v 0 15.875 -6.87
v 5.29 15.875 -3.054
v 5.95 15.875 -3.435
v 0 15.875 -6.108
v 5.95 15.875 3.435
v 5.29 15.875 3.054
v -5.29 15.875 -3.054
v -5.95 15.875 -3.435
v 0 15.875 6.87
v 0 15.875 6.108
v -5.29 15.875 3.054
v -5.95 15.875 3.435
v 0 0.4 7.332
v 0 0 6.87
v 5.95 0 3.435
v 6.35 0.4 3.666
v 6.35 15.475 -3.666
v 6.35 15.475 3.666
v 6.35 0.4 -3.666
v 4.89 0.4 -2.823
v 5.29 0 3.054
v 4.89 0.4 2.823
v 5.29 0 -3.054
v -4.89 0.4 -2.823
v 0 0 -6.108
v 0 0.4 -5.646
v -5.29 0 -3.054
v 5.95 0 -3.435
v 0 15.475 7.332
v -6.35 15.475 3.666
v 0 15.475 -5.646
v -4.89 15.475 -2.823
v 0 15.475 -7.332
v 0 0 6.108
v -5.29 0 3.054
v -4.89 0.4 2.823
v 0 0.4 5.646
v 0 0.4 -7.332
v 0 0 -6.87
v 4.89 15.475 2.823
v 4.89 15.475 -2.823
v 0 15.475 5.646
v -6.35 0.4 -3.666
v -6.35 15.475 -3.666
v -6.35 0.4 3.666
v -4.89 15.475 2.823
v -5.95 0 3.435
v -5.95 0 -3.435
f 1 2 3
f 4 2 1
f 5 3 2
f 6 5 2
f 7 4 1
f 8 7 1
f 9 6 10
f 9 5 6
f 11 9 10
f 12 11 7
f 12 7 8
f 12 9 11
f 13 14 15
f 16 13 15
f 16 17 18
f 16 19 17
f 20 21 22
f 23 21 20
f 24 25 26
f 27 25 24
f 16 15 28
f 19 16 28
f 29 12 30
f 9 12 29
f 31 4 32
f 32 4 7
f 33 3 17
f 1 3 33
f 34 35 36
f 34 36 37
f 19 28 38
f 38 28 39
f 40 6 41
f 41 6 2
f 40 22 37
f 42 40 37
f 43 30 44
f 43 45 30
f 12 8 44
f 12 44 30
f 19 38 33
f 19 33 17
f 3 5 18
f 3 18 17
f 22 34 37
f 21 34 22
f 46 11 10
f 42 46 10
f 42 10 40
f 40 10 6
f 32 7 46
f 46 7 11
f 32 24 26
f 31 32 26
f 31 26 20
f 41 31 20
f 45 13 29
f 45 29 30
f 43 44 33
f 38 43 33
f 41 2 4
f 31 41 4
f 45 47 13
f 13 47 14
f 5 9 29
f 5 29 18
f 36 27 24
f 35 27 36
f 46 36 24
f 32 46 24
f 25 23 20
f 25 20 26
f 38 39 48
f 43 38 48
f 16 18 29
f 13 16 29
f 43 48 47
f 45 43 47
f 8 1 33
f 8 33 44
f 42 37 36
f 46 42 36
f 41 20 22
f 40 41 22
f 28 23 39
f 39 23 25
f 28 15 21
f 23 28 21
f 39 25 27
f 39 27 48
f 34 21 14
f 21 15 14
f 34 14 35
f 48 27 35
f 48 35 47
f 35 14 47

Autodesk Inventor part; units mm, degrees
ref_plane "YZ Plane" through (0, 0, 0) normal (1, 0, 0) x (0, 1, 0)
ref_plane "XZ Plane" through (0, 0, 0) normal (0, 1, 0) x (-1, 0, 0)
ref_plane "XY Plane" through (0, 0, 0) normal (0, 0, 1) x (1, 0, 0)
sketch "Sketch1" plane through (0, 0, 0) normal (0, 1, 0) x (-1, 0, 0)
  line L0 (6.35, -3.6662) -> (0, -7.3323)
  line L1 (0, -7.3323) -> (-6.35, -3.6662)
  line L2 (-6.35, -3.6662) -> (-6.35, 3.6662)
  line L3 (-6.35, 3.6662) -> (0, 7.3323)
  line L4 (0, 7.3323) -> (6.35, 3.6662)
  line L5 (6.35, 3.6662) -> (6.35, -3.6662)
  line L6 (-4.8895, 2.823) -> (0, 5.6459)
  line L7 (0, 5.6459) -> (4.8895, 2.823)
  line L8 (4.8895, 2.823) -> (4.8895, -2.823)
  line L9 (4.8895, -2.823) -> (0, -5.6459)
  line L10 (0, -5.6459) -> (-4.8895, -2.823)
  line L11 (-4.8895, -2.823) -> (-4.8895, 2.823)
  point P0 (0, 0)
  point P1 (0, 0)
  point P2 (0, 0)
  dimension "d0" = 9.779
  dimension "d1" = 12.7
extrude "Extrusion1" add sketch "Sketch1" along normal blind 15.875
chamfer "Chamfer1" distance 0.4 angle 45 24 edges at (-3.175, 0, 5.4993) (3.175, 0, 5.4993) (6.35, 0, 0) (3.175, 0, -5.4993) (-3.175, 0, -5.4993) (-6.35, 0, 0) (-2.4447, 0, -4.2344) (2.4448, 0, -4.2344) (4.8895, 0, 0) (2.4447, 0, 4.2344) (-2.4447, 0, 4.2344) (-4.8895, 0, 0) (-4.8895, 15.875, 0) (-2.4447, 15.875, 4.2344) (2.4447, 15.875, 4.2344) (4.8895, 15.875, 0) (2.4448, 15.875, -4.2344) (-2.4447, 15.875, -4.2344) (-3.175, 15.875, -5.4993) (-6.35, 15.875, 0) (-3.175, 15.875, 5.4993) (3.175, 15.875, 5.4993) (6.35, 15.875, 0) (3.175, 15.875, -5.4993)
properties part number "0_5_Hex_0_375_Hex_Adapter" material "Aluminum 6061"
